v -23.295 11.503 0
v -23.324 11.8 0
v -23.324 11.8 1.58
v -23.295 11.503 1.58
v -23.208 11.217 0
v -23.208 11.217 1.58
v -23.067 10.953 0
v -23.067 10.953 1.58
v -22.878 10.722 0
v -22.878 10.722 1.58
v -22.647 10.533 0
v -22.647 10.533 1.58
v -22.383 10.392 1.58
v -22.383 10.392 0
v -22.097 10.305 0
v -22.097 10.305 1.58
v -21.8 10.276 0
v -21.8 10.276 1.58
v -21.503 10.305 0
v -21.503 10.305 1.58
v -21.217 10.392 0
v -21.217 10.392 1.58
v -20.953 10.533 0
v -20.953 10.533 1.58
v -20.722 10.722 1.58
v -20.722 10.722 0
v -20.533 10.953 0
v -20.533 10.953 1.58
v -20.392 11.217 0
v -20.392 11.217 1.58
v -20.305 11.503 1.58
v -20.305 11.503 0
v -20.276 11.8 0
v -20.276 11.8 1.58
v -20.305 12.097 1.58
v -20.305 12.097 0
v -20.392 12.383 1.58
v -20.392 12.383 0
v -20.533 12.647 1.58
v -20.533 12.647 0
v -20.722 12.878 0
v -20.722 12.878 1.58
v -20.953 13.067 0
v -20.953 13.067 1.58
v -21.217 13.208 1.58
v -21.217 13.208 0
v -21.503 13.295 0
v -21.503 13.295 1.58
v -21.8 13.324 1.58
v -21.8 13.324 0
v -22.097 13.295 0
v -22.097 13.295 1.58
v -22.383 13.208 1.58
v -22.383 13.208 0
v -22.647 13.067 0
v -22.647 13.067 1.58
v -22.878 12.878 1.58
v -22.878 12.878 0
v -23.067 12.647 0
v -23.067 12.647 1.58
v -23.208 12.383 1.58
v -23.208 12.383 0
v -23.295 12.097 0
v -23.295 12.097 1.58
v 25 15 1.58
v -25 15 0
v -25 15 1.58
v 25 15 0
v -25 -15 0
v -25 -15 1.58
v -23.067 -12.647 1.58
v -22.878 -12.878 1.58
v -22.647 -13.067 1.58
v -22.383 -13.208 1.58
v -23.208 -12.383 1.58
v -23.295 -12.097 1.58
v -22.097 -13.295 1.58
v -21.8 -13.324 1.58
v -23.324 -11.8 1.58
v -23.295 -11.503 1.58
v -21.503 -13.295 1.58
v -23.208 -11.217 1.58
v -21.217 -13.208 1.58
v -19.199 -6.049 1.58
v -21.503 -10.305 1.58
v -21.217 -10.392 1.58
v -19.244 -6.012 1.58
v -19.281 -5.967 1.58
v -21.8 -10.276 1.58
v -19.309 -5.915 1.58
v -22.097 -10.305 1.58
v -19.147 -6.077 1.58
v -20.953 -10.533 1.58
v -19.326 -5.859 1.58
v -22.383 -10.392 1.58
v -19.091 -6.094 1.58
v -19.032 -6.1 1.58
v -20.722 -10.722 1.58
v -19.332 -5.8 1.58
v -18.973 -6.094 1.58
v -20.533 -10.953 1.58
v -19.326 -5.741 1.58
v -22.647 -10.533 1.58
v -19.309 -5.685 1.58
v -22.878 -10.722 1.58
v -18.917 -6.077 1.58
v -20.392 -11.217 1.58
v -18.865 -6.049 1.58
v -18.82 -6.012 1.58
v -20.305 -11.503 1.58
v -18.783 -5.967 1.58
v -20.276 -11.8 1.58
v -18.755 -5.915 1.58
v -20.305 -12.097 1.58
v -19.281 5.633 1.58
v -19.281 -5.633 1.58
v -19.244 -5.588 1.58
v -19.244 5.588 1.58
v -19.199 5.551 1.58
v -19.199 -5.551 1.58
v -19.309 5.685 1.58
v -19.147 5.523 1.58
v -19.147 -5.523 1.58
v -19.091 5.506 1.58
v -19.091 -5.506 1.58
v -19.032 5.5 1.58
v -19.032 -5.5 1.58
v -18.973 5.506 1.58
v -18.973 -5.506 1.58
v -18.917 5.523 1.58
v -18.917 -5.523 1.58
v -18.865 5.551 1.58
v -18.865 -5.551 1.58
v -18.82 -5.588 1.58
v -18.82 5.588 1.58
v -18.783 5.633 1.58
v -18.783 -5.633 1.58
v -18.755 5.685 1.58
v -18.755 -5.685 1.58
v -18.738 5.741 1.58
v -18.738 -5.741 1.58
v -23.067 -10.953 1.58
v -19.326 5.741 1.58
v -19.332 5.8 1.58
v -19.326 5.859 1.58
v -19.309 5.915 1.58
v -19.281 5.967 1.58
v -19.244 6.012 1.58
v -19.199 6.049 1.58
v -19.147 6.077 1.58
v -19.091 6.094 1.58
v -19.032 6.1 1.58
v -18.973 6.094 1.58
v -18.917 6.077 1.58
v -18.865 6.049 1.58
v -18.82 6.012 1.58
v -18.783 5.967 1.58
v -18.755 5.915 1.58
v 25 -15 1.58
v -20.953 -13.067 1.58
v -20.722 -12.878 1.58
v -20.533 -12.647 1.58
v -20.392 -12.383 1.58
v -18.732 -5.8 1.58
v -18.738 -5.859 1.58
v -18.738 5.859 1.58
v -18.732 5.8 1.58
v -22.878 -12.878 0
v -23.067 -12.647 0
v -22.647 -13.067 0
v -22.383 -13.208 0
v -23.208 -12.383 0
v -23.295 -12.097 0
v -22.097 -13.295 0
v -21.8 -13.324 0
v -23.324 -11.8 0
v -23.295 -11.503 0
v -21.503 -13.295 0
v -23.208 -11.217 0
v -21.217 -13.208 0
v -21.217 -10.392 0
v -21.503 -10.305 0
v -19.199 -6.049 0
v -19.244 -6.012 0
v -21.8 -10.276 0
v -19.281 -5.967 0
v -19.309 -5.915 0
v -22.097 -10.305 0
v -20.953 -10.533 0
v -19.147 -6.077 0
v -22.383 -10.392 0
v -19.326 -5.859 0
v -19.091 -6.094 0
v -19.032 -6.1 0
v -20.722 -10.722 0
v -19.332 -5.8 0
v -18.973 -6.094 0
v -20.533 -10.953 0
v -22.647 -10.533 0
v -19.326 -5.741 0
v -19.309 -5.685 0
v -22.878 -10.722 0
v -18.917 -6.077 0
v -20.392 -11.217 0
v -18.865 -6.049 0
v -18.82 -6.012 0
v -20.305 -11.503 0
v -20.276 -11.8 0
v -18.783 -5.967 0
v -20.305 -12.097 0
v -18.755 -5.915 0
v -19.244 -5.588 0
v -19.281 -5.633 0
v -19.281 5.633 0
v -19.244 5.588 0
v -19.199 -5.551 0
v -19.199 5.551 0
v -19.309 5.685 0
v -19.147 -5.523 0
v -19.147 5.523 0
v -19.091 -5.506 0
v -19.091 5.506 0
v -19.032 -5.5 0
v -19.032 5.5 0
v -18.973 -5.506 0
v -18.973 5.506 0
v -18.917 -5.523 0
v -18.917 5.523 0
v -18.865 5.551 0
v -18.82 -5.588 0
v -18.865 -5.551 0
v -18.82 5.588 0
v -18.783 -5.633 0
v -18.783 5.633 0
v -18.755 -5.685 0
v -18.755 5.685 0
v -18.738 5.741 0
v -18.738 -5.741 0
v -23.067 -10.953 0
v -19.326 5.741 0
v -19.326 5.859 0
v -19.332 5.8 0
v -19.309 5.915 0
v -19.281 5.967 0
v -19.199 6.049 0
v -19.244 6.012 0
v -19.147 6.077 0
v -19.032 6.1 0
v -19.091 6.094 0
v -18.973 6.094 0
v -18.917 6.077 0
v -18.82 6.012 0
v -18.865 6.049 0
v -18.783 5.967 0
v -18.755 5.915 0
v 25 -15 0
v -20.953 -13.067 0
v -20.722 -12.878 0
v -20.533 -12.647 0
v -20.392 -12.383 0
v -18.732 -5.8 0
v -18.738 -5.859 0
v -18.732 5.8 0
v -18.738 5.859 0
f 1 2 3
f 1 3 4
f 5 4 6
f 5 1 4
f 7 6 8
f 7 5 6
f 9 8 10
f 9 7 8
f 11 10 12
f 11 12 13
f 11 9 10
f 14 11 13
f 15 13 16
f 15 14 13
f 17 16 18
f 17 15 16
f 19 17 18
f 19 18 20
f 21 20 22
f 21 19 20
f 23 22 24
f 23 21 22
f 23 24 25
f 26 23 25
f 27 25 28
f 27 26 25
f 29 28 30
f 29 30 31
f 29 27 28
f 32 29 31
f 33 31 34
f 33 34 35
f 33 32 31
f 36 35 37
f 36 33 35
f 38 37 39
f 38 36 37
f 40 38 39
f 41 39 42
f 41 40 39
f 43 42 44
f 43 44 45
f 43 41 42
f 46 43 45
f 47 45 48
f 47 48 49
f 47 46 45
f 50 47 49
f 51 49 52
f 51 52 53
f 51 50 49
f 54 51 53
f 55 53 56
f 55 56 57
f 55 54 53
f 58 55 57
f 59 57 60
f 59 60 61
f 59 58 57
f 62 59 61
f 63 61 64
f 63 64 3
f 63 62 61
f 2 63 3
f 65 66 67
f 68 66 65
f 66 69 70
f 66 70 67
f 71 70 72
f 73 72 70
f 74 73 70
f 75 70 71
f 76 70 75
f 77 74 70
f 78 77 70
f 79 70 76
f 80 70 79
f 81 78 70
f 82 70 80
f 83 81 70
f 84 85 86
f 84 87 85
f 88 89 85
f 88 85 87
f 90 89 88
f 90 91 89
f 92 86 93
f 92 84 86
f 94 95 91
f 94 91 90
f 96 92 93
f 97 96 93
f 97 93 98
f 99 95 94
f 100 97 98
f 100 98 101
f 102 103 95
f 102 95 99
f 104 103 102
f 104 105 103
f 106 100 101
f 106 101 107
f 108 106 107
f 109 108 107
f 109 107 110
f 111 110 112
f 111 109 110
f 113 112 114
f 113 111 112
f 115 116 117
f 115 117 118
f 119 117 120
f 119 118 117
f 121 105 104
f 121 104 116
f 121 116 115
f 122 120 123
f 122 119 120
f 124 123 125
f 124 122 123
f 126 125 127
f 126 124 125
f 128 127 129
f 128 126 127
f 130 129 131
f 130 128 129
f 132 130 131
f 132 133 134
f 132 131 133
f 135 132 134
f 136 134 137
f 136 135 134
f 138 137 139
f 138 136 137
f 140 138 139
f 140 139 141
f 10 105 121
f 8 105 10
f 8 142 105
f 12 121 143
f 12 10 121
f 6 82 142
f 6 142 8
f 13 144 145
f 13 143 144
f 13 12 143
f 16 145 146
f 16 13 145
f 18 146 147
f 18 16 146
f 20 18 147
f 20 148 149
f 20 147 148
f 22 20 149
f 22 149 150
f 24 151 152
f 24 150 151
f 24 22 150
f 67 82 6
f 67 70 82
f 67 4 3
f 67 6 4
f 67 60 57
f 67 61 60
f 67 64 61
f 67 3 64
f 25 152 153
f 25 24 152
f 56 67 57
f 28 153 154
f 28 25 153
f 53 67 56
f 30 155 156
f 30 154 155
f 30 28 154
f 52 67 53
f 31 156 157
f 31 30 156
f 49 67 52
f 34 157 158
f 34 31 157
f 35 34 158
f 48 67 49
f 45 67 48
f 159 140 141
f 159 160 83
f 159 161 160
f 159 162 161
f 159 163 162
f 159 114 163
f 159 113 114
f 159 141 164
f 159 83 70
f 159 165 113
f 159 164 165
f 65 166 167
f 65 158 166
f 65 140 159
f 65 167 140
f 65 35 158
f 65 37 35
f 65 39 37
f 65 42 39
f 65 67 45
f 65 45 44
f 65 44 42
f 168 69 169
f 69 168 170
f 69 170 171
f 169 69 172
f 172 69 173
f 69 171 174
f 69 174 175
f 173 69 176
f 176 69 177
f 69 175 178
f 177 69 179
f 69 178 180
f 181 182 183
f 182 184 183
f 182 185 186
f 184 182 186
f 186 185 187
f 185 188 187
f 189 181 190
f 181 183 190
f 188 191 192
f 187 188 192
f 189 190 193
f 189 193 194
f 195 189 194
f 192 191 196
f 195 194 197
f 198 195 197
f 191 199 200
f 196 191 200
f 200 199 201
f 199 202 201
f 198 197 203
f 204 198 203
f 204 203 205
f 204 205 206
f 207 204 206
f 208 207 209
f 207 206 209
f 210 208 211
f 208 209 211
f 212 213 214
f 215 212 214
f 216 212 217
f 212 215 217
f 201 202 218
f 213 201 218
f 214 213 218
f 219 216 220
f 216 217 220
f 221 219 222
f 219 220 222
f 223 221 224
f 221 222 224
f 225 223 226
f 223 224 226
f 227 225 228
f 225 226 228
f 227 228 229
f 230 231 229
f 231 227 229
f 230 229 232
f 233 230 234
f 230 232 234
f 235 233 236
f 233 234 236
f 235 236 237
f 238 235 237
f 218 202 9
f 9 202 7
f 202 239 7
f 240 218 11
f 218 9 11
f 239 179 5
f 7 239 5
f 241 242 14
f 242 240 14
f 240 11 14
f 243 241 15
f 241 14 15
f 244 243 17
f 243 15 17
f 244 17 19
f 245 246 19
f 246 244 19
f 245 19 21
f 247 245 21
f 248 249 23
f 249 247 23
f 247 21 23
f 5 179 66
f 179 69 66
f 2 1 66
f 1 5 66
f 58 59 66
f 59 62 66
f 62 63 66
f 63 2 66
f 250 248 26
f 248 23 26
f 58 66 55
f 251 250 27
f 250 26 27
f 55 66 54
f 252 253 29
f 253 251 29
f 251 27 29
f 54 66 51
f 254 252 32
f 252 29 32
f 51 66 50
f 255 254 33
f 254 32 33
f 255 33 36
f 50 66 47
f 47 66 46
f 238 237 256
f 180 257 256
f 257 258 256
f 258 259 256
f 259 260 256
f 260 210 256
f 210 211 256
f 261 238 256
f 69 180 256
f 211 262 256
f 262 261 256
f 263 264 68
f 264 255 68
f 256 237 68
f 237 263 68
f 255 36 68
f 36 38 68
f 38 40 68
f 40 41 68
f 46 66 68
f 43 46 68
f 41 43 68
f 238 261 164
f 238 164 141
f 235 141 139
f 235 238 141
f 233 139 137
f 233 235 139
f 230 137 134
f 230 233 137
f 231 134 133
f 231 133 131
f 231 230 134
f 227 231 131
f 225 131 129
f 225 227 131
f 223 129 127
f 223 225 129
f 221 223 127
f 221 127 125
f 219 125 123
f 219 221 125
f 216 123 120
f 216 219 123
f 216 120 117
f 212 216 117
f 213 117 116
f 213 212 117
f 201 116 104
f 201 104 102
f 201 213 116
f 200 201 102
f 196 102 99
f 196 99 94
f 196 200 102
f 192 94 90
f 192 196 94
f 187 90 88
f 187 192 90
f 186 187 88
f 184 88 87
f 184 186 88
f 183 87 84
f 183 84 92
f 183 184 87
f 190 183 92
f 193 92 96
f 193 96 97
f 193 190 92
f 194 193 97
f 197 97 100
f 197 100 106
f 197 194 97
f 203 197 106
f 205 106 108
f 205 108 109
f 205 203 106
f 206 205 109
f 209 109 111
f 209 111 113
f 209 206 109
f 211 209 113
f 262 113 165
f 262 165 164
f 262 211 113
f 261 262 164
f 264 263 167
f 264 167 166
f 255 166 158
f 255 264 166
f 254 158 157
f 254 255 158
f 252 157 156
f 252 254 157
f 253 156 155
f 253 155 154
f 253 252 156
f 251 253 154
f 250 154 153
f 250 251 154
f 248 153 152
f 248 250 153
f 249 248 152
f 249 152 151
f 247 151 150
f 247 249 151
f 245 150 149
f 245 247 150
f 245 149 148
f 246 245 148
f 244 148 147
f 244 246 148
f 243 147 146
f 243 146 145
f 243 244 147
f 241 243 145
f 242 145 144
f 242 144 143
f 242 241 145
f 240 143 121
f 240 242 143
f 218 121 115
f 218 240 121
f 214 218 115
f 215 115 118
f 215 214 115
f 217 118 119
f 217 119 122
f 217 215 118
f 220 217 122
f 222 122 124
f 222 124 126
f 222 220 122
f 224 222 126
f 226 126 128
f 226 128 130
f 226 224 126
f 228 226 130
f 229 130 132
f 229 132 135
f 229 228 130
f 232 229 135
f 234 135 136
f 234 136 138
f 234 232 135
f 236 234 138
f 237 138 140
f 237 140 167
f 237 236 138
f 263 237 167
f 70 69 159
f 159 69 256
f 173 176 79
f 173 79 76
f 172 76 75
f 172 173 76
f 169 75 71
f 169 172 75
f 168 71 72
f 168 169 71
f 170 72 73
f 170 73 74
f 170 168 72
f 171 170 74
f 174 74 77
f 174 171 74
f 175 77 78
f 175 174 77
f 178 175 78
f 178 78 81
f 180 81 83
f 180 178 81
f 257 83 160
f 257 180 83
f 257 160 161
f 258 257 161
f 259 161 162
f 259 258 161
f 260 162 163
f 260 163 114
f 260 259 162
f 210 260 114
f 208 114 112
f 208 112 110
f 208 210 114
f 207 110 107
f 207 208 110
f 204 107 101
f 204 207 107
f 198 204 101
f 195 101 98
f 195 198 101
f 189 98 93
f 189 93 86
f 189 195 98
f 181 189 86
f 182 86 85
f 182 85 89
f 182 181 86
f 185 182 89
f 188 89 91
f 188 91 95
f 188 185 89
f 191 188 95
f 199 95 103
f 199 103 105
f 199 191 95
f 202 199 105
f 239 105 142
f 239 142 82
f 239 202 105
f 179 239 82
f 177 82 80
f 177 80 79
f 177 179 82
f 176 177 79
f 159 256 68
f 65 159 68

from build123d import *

# Parameters (mm, degrees)
SKETCH1_W           = 50
SKETCH1_H           = 30
SKETCH1_R           = 1.524
SKETCH1_R_2         = 0.3
BOSS_EXTRUDE1_DEPTH = 1.58


with BuildPart() as part:
    # Sketch1 → Boss-Extrude1 (new body)
    with BuildSketch(Plane.XY):
        Rectangle(SKETCH1_W, SKETCH1_H)
        with Locations(Location((-21.8, 11.8, 0), (0, 0, 180))):
            Circle(SKETCH1_R, mode=Mode.SUBTRACT)
        with Locations(Location((-21.8, -11.8, 0), (0, 0, 180))):
            Circle(SKETCH1_R, mode=Mode.SUBTRACT)
        with Locations((-19.032, 5.8)):
            Circle(SKETCH1_R_2, mode=Mode.SUBTRACT)
        with Locations((-19.032, -5.8)):
            Circle(SKETCH1_R_2, mode=Mode.SUBTRACT)
    extrude(amount=BOSS_EXTRUDE1_DEPTH)


solid = part.part
